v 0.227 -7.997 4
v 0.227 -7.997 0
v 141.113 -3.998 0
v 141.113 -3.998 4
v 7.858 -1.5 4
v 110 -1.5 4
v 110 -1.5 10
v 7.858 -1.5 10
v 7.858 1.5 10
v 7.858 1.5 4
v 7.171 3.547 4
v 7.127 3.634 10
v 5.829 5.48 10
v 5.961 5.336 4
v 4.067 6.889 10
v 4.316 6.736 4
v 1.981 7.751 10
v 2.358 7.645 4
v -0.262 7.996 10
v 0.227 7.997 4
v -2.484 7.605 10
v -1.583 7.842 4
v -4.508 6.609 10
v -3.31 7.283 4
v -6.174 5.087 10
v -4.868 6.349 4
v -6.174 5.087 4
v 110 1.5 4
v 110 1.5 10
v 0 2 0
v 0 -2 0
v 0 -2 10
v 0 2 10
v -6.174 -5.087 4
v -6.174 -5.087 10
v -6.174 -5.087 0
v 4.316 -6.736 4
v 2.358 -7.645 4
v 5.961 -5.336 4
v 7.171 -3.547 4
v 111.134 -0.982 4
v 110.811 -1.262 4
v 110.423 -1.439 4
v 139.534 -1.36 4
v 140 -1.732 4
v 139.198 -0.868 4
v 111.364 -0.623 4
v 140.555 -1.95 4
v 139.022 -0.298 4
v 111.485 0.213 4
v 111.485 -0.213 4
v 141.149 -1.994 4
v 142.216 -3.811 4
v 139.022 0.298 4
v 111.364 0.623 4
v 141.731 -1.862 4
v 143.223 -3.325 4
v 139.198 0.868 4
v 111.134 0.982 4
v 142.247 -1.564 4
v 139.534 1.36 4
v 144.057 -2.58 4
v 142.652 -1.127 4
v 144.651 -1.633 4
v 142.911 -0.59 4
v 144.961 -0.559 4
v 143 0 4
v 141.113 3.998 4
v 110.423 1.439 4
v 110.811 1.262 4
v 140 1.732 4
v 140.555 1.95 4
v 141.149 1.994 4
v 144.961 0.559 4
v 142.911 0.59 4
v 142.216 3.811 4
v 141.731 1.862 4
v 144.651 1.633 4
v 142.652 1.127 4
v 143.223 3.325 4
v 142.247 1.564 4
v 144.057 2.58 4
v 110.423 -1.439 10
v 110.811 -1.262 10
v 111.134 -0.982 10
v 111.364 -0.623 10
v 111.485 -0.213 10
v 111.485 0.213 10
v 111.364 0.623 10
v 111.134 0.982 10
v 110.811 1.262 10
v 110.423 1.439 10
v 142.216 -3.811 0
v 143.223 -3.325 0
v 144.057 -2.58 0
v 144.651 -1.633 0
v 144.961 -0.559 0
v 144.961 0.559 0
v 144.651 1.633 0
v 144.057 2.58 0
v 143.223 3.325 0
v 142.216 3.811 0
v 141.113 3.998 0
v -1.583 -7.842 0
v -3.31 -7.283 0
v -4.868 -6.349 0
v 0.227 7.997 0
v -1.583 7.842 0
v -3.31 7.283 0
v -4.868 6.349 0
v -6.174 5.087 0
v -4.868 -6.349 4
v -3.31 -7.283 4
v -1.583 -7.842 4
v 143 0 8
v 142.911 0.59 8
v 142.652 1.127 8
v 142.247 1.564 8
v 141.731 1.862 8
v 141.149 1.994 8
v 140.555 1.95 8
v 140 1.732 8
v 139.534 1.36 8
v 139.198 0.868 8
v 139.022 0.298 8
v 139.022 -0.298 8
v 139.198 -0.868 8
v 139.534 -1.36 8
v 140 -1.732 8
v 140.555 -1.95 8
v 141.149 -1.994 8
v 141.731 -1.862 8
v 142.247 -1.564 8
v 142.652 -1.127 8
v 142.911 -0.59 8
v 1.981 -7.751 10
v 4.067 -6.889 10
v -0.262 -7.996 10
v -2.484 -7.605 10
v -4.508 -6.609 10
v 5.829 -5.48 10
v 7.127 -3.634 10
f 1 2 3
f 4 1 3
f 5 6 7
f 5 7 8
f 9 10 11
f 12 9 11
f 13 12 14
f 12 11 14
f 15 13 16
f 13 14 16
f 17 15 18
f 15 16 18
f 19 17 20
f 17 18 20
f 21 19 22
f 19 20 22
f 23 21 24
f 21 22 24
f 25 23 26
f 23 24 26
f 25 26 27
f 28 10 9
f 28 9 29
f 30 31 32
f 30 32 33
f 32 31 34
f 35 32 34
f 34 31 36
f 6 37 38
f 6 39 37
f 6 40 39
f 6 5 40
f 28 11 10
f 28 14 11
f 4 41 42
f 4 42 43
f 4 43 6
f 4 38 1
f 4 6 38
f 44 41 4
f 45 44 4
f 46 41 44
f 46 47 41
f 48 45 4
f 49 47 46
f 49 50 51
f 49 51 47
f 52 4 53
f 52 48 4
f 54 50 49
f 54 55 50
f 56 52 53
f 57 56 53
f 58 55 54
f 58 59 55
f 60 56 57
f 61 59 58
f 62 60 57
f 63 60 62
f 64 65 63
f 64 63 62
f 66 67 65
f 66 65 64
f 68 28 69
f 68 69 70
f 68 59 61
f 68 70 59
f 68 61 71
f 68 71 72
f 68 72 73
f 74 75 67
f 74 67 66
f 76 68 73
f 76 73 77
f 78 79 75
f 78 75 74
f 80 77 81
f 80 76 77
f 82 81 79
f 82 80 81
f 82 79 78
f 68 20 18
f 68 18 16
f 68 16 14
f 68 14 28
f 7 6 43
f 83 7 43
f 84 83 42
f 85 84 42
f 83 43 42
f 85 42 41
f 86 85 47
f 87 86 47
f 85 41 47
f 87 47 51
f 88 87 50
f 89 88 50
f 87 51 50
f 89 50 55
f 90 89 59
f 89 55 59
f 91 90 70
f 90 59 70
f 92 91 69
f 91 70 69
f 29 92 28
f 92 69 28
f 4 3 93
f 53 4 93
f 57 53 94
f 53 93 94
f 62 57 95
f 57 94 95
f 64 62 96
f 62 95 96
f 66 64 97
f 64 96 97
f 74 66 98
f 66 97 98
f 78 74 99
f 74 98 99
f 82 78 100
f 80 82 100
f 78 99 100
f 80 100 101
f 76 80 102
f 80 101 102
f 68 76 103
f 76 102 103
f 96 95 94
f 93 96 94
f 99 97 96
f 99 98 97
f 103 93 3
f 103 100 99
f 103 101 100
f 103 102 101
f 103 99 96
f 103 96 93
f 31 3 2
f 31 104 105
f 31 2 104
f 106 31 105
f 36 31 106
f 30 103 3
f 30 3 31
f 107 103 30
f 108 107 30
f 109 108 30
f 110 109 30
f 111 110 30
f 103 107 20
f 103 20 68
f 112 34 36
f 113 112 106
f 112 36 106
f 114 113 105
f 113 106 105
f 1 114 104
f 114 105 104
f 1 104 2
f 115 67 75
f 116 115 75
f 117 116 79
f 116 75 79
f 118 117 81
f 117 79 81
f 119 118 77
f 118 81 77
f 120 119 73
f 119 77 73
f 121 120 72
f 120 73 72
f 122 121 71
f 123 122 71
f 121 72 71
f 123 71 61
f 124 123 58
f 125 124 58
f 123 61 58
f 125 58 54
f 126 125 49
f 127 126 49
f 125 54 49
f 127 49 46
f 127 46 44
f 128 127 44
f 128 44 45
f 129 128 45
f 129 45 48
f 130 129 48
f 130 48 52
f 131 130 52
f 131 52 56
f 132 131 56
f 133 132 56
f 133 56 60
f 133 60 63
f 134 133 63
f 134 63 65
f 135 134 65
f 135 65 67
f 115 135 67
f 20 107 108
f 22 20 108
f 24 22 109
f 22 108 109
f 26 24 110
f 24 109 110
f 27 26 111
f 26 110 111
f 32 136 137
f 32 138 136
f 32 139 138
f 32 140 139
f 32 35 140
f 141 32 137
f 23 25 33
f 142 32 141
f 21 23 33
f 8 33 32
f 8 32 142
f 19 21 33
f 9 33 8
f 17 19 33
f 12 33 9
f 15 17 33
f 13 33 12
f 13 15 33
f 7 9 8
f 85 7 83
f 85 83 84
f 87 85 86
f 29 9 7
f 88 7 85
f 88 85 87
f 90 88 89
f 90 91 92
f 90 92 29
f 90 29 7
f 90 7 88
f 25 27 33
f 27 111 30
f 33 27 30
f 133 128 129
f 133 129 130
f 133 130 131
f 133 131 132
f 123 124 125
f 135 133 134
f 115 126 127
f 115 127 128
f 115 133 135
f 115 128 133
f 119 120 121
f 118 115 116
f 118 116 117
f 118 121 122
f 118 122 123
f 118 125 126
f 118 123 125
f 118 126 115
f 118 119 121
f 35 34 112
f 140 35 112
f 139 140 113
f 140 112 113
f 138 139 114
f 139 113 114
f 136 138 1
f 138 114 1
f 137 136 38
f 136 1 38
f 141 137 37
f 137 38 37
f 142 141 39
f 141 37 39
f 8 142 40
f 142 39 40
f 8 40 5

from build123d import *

# Parameters (mm, degrees)
PAD_DEPTH    = 4
SKETCH001_R  = 8
PAD001_DEPTH = 10
POCKET_DEPTH = 10.001
SKETCH003_R  = 2
PAD002_DEPTH = 8
PAD003_DEPTH = 10


with BuildPart() as part:
    # Sketch → Pad (new body)
    with BuildSketch(Plane.XY):
        with BuildLine():
            ThreePointArc((0.22695, 7.99678), (-8, 0), (0.22695, -7.99678))
            Line((0.22695, -7.99678), (141.113475, -3.99839))
            ThreePointArc((141.113475, -3.99839), (145, 0), (141.113475, 3.99839))
            Line((0.22695, 7.99678), (141.113475, 3.99839))
        make_face()
    extrude(amount=PAD_DEPTH)

    # Sketch001 → Pad001 (join)
    with BuildSketch(Plane.XY):
        Circle(SKETCH001_R)
    extrude(amount=PAD001_DEPTH)

    # Sketch002 → Pocket (cut, through all)
    with BuildSketch(Plane.XY):
        Polygon((0, -2), (-8, -6), (-8, 6), (0, 2), align=None)
    extrude(amount=POCKET_DEPTH, mode=Mode.SUBTRACT)

    # Sketch003 → Pad002 (join)
    with BuildSketch(Plane.XY):
        with Locations((141, 0)):
            Circle(SKETCH003_R)
    extrude(amount=PAD002_DEPTH)

    # Sketch004 → Pad003 (join)
    with BuildSketch(Plane.XY):
        with BuildLine():
            Line((0, 1.5), (110.000009, 1.5))
            ThreePointArc((110, -1.5), (111.5, -5e-06), (110.000009, 1.5))
            Line((110, -1.5), (0, -1.5))
            Line((0, -1.5), (0, 1.5))
        make_face()
    extrude(amount=PAD003_DEPTH)


solid = part.part
